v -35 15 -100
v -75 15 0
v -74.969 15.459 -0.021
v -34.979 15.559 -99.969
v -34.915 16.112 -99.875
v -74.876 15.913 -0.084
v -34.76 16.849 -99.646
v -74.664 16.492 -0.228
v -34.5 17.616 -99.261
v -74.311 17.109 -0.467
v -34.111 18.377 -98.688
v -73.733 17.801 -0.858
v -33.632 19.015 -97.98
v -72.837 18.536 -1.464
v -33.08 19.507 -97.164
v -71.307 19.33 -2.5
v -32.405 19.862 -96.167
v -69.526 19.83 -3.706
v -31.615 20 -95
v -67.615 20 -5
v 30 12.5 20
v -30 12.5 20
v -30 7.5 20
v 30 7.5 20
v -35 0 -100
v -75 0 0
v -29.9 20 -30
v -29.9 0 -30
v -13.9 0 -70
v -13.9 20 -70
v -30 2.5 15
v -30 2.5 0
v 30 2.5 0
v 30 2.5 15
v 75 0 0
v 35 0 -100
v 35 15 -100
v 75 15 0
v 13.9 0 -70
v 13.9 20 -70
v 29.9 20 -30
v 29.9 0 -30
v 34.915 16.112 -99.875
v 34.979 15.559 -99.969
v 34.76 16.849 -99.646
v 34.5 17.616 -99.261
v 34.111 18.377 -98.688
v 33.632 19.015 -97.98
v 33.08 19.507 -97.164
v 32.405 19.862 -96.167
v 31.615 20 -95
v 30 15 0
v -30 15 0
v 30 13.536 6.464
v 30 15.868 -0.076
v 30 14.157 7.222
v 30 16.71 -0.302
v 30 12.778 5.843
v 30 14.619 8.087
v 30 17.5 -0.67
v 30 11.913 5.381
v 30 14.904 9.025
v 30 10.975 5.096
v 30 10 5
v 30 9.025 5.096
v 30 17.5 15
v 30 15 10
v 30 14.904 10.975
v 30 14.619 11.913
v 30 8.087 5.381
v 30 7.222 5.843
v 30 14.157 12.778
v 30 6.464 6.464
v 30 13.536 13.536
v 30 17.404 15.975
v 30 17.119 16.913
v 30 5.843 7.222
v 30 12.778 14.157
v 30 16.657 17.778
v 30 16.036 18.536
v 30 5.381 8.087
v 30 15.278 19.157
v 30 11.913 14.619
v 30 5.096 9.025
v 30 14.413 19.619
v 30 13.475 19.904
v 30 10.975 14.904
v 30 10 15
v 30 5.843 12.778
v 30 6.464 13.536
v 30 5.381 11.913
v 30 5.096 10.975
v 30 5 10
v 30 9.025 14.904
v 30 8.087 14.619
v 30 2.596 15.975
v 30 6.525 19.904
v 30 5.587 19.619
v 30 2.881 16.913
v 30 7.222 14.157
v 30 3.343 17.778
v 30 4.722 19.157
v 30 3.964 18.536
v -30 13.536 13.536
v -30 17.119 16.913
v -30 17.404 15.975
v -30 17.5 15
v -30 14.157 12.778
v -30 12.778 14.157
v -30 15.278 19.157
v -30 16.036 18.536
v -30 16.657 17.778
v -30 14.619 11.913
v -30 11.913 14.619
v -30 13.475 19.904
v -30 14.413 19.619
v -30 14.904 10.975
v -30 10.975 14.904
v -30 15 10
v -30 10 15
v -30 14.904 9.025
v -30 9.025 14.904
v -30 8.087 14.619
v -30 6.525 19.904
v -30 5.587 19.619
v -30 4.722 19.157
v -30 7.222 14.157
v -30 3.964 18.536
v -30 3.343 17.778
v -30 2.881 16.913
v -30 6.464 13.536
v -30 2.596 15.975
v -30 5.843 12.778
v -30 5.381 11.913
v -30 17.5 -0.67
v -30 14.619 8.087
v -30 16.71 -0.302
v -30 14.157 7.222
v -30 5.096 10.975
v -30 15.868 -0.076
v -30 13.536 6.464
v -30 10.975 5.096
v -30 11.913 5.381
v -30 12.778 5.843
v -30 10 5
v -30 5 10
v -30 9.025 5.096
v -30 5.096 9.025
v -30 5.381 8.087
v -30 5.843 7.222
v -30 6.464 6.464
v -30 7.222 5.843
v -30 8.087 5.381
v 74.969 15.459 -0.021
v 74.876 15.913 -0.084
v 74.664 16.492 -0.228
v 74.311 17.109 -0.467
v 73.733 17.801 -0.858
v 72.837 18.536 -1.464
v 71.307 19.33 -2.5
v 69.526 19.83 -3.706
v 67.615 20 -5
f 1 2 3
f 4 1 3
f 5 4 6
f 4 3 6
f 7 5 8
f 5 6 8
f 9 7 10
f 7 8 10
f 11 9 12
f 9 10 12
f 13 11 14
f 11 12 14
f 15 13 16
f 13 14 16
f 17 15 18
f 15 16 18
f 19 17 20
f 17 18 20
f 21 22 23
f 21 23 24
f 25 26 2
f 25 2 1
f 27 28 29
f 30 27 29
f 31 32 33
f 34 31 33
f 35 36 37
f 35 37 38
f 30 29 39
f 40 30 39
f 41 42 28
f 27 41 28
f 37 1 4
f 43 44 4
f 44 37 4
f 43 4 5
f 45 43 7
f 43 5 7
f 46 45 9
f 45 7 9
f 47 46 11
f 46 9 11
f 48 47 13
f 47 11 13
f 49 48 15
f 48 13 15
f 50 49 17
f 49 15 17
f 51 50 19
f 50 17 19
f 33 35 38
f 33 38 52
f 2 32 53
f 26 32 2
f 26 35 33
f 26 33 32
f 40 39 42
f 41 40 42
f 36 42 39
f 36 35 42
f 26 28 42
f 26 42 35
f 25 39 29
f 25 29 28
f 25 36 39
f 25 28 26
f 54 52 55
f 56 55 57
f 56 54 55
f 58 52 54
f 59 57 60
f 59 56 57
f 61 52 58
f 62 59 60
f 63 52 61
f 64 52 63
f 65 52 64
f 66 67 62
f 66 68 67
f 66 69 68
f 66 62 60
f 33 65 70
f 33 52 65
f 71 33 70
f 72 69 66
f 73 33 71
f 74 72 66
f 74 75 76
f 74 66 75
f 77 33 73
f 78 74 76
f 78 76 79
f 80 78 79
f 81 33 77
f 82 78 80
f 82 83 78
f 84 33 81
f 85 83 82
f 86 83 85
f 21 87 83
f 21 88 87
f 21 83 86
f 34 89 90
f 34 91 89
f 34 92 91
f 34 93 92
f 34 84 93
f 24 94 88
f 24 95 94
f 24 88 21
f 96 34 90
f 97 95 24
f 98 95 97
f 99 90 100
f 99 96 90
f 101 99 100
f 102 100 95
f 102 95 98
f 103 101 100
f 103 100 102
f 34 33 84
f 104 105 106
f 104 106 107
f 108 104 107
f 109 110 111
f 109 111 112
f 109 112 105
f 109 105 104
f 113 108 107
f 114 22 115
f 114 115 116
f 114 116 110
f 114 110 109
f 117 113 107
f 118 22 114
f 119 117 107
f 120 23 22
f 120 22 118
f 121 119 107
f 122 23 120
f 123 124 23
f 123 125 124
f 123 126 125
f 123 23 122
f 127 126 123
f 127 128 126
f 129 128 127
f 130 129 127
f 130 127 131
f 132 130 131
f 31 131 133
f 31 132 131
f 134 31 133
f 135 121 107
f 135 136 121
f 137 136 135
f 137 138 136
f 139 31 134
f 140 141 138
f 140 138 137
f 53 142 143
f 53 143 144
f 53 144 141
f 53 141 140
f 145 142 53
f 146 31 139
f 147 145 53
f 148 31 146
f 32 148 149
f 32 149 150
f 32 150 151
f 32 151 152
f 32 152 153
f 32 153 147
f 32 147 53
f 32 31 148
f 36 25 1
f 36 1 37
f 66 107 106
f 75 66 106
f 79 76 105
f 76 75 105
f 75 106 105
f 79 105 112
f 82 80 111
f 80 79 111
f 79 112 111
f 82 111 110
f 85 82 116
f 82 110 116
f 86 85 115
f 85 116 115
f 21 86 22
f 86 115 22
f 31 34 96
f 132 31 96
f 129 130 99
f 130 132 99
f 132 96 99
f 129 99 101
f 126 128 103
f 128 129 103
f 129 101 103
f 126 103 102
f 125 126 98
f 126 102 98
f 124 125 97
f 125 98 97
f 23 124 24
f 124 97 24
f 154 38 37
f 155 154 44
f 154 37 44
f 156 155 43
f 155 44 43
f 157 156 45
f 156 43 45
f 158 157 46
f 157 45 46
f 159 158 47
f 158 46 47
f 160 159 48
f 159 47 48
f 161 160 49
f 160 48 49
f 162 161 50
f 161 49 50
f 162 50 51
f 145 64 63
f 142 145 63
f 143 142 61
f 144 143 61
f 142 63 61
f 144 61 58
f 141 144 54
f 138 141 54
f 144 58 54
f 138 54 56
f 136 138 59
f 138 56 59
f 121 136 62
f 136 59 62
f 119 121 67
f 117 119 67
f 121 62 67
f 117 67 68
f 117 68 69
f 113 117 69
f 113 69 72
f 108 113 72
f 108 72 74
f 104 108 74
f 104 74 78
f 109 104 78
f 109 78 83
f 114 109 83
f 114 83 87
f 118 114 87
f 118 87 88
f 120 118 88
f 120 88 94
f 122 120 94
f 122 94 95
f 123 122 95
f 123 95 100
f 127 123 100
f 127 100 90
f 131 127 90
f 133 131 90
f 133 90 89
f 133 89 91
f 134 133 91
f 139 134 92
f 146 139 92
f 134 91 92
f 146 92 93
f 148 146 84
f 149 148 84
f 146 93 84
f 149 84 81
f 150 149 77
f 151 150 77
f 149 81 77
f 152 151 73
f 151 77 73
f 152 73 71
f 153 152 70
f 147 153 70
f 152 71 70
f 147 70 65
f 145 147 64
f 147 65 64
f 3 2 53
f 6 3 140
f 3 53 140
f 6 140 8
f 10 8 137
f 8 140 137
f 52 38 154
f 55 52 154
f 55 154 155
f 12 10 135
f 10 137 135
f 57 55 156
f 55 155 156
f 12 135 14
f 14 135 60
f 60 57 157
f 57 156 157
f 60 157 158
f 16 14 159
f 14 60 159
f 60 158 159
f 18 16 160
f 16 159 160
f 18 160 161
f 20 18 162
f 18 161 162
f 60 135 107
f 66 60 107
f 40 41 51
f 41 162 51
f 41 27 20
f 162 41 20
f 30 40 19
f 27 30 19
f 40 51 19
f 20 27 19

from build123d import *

# Parameters (mm, degrees)
BOSS_EXTRUDE1_DEPTH = 20
SKETCH2_W           = 60
SKETCH2_H           = 15
BOSS_EXTRUDE2_DEPTH = 20
SKETCH3_R           = 5
CUT_EXTRUDE1_DEPTH  = 147.372811683
FILLET1_R           = 5


with BuildPart() as part:
    # Sketch1 → Boss-Extrude1 (new body)
    with BuildSketch(Plane(origin=(0, 0, 0), x_dir=(1, 0, 0), z_dir=(0, 1, 0))):
        Polygon((-35, 100), (35, 100), (75, 0), (-75, 0), align=None)
        Polygon((-13.9, 70), (13.9, 70), (29.9, 30), (-29.9, 30), align=None, mode=Mode.SUBTRACT)
    extrude(amount=BOSS_EXTRUDE1_DEPTH)

    # Sketch2 → Boss-Extrude2 (add)
    with BuildSketch(Plane.XY):
        with Locations((0, 10)):
            Rectangle(SKETCH2_W, SKETCH2_H)
    extrude(amount=BOSS_EXTRUDE2_DEPTH)

    # Sketch3 → Cut-Extrude1 (cut, through all)
    with BuildSketch(Plane(origin=(30, 0, 0), x_dir=(0, 0, -1), z_dir=(1, 0, 0))):
        with Locations((-10, 10)):
            Circle(SKETCH3_R)
    extrude(amount=-CUT_EXTRUDE1_DEPTH, mode=Mode.SUBTRACT)

    # Fillet1
    # the kernel refuses this fillet: 5 mm, written as the material it takes off along each edge
    with BuildSketch(Plane(origin=(87.5, 20, 0), x_dir=(0, 0, -1), z_dir=(-1, 0, 0))) as fillet1_piece_1_section:
        with BuildLine():
            CenterArc((FILLET1_R, FILLET1_R), FILLET1_R, 180, 90)
            Line((0, FILLET1_R), (0, 0))
            Line((0, 0), (FILLET1_R, 0))
        make_face()
    fillet1_piece_1 = extrude(amount=175, mode=Mode.PRIVATE)
    fillet1_piece_1 = split(fillet1_piece_1, bisect_by=Plane(origin=(30, 19.178041178, -1.2756003), z_dir=(1, 0, 0)), keep=Keep.TOP, mode=Mode.PRIVATE)
    fillet1_piece_1 = split(fillet1_piece_1, bisect_by=Plane(origin=(58.75, 17.5, -1.2756003), z_dir=(0, 1, 0)), keep=Keep.TOP, mode=Mode.PRIVATE)
    add(fillet1_piece_1, mode=Mode.SUBTRACT)
    with BuildSketch(Plane(origin=(87.5, 20, 0), x_dir=(0, 0, -1), z_dir=(-1, 0, 0))) as fillet1_piece_2_section:
        with BuildLine():
            CenterArc((FILLET1_R, FILLET1_R), FILLET1_R, 180, 90)
            Line((0, FILLET1_R), (0, 0))
            Line((0, 0), (FILLET1_R, 0))
        make_face()
    fillet1_piece_2 = extrude(amount=175, mode=Mode.PRIVATE)
    fillet1_piece_2 = split(fillet1_piece_2, bisect_by=Plane(origin=(30, 16.683746077, -0.120041908), z_dir=(1, 0, 0)), keep=Keep.TOP, mode=Mode.PRIVATE)
    fillet1_piece_2 = split(fillet1_piece_2, bisect_by=Plane(origin=(58.75, 17.5, -0.120041908), z_dir=(0, -1, 0)), keep=Keep.TOP, mode=Mode.PRIVATE)
    add(fillet1_piece_2, mode=Mode.SUBTRACT)
    with BuildSketch(Plane(origin=(87.5, 20, 0), x_dir=(0, 0, -1), z_dir=(-1, 0, 0))) as fillet1_piece_3_section:
        with BuildLine():
            CenterArc((FILLET1_R, FILLET1_R), FILLET1_R, 180, 90)
            Line((0, FILLET1_R), (0, 0))
            Line((0, 0), (FILLET1_R, 0))
        make_face()
    fillet1_piece_3 = extrude(amount=175, mode=Mode.PRIVATE)
    fillet1_piece_3 = split(fillet1_piece_3, bisect_by=Plane(origin=(-30, 19.178041178, -1.2756003), z_dir=(1, 0, 0)), keep=Keep.TOP, mode=Mode.PRIVATE)
    fillet1_piece_3 = split(fillet1_piece_3, bisect_by=Plane(origin=(30, 19.178041178, -1.2756003), z_dir=(-1, 0, 0)), keep=Keep.TOP, mode=Mode.PRIVATE)
    fillet1_piece_3 = split(fillet1_piece_3, bisect_by=Plane(origin=(0, 17.5, -1.2756003), z_dir=(0, 1, 0)), keep=Keep.TOP, mode=Mode.PRIVATE)
    add(fillet1_piece_3, mode=Mode.SUBTRACT)
    with BuildSketch(Plane(origin=(87.5, 20, 0), x_dir=(0, 0, -1), z_dir=(-1, 0, 0))) as fillet1_piece_4_section:
        with BuildLine():
            CenterArc((FILLET1_R, FILLET1_R), FILLET1_R, 180, 90)
            Line((0, FILLET1_R), (0, 0))
            Line((0, 0), (FILLET1_R, 0))
        make_face()
    fillet1_piece_4 = extrude(amount=175, mode=Mode.PRIVATE)
    fillet1_piece_4 = split(fillet1_piece_4, bisect_by=Plane(origin=(-30, 19.178041178, -1.2756003), z_dir=(-1, 0, 0)), keep=Keep.TOP, mode=Mode.PRIVATE)
    fillet1_piece_4 = split(fillet1_piece_4, bisect_by=Plane(origin=(-58.75, 17.5, -1.2756003), z_dir=(0, 1, 0)), keep=Keep.TOP, mode=Mode.PRIVATE)
    add(fillet1_piece_4, mode=Mode.SUBTRACT)
    with BuildSketch(Plane(origin=(87.5, 20, 0), x_dir=(0, 0, -1), z_dir=(-1, 0, 0))) as fillet1_piece_5_section:
        with BuildLine():
            CenterArc((FILLET1_R, FILLET1_R), FILLET1_R, 180, 90)
            Line((0, FILLET1_R), (0, 0))
            Line((0, 0), (FILLET1_R, 0))
        make_face()
    fillet1_piece_5 = extrude(amount=175, mode=Mode.PRIVATE)
    fillet1_piece_5 = split(fillet1_piece_5, bisect_by=Plane(origin=(-30, 16.683746077, -0.120041908), z_dir=(-1, 0, 0)), keep=Keep.TOP, mode=Mode.PRIVATE)
    fillet1_piece_5 = split(fillet1_piece_5, bisect_by=Plane(origin=(-58.75, 17.5, -0.120041908), z_dir=(0, -1, 0)), keep=Keep.TOP, mode=Mode.PRIVATE)
    add(fillet1_piece_5, mode=Mode.SUBTRACT)
    with BuildSketch(Plane(origin=(-79.642383454, 20, 11.605958636), x_dir=(0, -1, 0), z_dir=(0.37139067635410355, 0, -0.9284766908852595)), Plane(origin=(30.357616546, 20, -111.605958636), x_dir=(0, -1, 0), z_dir=(0.37139067635410383, 0, 0.9284766908852593))) as fillet1_piece_6:
        with BuildLine():
            CenterArc((FILLET1_R, -FILLET1_R), FILLET1_R, 90, 90)
            Line((0, -FILLET1_R), (0, 0))
            Line((0, 0), (FILLET1_R, 0))
        make_face()
    extrude(amount=132.703296143, mode=Mode.SUBTRACT)
    with BuildSketch(Plane(origin=(-47.5, 20, -100), x_dir=(0, -1, 0), z_dir=(1, 0, 0))) as fillet1_piece_7:
        with BuildLine():
            CenterArc((FILLET1_R, -FILLET1_R), FILLET1_R, 90, 90)
            Line((0, -FILLET1_R), (0, 0))
            Line((0, 0), (FILLET1_R, 0))
        make_face()
    extrude(amount=95, mode=Mode.SUBTRACT)
    with BuildSketch(Plane(origin=(42.5, 2.5, 20), x_dir=(0, 0, -1), z_dir=(-1, 0, 0)), Plane(origin=(-42.5, 17.5, 20), x_dir=(0, 0, -1), z_dir=(1, 0, 0))) as fillet1_piece_8:
        with BuildLine():
            CenterArc((FILLET1_R, -FILLET1_R), FILLET1_R, 90, 90)
            Line((0, -FILLET1_R), (0, 0))
            Line((0, 0), (FILLET1_R, 0))
        make_face()
    extrude(amount=85, mode=Mode.SUBTRACT)


solid = part.part
